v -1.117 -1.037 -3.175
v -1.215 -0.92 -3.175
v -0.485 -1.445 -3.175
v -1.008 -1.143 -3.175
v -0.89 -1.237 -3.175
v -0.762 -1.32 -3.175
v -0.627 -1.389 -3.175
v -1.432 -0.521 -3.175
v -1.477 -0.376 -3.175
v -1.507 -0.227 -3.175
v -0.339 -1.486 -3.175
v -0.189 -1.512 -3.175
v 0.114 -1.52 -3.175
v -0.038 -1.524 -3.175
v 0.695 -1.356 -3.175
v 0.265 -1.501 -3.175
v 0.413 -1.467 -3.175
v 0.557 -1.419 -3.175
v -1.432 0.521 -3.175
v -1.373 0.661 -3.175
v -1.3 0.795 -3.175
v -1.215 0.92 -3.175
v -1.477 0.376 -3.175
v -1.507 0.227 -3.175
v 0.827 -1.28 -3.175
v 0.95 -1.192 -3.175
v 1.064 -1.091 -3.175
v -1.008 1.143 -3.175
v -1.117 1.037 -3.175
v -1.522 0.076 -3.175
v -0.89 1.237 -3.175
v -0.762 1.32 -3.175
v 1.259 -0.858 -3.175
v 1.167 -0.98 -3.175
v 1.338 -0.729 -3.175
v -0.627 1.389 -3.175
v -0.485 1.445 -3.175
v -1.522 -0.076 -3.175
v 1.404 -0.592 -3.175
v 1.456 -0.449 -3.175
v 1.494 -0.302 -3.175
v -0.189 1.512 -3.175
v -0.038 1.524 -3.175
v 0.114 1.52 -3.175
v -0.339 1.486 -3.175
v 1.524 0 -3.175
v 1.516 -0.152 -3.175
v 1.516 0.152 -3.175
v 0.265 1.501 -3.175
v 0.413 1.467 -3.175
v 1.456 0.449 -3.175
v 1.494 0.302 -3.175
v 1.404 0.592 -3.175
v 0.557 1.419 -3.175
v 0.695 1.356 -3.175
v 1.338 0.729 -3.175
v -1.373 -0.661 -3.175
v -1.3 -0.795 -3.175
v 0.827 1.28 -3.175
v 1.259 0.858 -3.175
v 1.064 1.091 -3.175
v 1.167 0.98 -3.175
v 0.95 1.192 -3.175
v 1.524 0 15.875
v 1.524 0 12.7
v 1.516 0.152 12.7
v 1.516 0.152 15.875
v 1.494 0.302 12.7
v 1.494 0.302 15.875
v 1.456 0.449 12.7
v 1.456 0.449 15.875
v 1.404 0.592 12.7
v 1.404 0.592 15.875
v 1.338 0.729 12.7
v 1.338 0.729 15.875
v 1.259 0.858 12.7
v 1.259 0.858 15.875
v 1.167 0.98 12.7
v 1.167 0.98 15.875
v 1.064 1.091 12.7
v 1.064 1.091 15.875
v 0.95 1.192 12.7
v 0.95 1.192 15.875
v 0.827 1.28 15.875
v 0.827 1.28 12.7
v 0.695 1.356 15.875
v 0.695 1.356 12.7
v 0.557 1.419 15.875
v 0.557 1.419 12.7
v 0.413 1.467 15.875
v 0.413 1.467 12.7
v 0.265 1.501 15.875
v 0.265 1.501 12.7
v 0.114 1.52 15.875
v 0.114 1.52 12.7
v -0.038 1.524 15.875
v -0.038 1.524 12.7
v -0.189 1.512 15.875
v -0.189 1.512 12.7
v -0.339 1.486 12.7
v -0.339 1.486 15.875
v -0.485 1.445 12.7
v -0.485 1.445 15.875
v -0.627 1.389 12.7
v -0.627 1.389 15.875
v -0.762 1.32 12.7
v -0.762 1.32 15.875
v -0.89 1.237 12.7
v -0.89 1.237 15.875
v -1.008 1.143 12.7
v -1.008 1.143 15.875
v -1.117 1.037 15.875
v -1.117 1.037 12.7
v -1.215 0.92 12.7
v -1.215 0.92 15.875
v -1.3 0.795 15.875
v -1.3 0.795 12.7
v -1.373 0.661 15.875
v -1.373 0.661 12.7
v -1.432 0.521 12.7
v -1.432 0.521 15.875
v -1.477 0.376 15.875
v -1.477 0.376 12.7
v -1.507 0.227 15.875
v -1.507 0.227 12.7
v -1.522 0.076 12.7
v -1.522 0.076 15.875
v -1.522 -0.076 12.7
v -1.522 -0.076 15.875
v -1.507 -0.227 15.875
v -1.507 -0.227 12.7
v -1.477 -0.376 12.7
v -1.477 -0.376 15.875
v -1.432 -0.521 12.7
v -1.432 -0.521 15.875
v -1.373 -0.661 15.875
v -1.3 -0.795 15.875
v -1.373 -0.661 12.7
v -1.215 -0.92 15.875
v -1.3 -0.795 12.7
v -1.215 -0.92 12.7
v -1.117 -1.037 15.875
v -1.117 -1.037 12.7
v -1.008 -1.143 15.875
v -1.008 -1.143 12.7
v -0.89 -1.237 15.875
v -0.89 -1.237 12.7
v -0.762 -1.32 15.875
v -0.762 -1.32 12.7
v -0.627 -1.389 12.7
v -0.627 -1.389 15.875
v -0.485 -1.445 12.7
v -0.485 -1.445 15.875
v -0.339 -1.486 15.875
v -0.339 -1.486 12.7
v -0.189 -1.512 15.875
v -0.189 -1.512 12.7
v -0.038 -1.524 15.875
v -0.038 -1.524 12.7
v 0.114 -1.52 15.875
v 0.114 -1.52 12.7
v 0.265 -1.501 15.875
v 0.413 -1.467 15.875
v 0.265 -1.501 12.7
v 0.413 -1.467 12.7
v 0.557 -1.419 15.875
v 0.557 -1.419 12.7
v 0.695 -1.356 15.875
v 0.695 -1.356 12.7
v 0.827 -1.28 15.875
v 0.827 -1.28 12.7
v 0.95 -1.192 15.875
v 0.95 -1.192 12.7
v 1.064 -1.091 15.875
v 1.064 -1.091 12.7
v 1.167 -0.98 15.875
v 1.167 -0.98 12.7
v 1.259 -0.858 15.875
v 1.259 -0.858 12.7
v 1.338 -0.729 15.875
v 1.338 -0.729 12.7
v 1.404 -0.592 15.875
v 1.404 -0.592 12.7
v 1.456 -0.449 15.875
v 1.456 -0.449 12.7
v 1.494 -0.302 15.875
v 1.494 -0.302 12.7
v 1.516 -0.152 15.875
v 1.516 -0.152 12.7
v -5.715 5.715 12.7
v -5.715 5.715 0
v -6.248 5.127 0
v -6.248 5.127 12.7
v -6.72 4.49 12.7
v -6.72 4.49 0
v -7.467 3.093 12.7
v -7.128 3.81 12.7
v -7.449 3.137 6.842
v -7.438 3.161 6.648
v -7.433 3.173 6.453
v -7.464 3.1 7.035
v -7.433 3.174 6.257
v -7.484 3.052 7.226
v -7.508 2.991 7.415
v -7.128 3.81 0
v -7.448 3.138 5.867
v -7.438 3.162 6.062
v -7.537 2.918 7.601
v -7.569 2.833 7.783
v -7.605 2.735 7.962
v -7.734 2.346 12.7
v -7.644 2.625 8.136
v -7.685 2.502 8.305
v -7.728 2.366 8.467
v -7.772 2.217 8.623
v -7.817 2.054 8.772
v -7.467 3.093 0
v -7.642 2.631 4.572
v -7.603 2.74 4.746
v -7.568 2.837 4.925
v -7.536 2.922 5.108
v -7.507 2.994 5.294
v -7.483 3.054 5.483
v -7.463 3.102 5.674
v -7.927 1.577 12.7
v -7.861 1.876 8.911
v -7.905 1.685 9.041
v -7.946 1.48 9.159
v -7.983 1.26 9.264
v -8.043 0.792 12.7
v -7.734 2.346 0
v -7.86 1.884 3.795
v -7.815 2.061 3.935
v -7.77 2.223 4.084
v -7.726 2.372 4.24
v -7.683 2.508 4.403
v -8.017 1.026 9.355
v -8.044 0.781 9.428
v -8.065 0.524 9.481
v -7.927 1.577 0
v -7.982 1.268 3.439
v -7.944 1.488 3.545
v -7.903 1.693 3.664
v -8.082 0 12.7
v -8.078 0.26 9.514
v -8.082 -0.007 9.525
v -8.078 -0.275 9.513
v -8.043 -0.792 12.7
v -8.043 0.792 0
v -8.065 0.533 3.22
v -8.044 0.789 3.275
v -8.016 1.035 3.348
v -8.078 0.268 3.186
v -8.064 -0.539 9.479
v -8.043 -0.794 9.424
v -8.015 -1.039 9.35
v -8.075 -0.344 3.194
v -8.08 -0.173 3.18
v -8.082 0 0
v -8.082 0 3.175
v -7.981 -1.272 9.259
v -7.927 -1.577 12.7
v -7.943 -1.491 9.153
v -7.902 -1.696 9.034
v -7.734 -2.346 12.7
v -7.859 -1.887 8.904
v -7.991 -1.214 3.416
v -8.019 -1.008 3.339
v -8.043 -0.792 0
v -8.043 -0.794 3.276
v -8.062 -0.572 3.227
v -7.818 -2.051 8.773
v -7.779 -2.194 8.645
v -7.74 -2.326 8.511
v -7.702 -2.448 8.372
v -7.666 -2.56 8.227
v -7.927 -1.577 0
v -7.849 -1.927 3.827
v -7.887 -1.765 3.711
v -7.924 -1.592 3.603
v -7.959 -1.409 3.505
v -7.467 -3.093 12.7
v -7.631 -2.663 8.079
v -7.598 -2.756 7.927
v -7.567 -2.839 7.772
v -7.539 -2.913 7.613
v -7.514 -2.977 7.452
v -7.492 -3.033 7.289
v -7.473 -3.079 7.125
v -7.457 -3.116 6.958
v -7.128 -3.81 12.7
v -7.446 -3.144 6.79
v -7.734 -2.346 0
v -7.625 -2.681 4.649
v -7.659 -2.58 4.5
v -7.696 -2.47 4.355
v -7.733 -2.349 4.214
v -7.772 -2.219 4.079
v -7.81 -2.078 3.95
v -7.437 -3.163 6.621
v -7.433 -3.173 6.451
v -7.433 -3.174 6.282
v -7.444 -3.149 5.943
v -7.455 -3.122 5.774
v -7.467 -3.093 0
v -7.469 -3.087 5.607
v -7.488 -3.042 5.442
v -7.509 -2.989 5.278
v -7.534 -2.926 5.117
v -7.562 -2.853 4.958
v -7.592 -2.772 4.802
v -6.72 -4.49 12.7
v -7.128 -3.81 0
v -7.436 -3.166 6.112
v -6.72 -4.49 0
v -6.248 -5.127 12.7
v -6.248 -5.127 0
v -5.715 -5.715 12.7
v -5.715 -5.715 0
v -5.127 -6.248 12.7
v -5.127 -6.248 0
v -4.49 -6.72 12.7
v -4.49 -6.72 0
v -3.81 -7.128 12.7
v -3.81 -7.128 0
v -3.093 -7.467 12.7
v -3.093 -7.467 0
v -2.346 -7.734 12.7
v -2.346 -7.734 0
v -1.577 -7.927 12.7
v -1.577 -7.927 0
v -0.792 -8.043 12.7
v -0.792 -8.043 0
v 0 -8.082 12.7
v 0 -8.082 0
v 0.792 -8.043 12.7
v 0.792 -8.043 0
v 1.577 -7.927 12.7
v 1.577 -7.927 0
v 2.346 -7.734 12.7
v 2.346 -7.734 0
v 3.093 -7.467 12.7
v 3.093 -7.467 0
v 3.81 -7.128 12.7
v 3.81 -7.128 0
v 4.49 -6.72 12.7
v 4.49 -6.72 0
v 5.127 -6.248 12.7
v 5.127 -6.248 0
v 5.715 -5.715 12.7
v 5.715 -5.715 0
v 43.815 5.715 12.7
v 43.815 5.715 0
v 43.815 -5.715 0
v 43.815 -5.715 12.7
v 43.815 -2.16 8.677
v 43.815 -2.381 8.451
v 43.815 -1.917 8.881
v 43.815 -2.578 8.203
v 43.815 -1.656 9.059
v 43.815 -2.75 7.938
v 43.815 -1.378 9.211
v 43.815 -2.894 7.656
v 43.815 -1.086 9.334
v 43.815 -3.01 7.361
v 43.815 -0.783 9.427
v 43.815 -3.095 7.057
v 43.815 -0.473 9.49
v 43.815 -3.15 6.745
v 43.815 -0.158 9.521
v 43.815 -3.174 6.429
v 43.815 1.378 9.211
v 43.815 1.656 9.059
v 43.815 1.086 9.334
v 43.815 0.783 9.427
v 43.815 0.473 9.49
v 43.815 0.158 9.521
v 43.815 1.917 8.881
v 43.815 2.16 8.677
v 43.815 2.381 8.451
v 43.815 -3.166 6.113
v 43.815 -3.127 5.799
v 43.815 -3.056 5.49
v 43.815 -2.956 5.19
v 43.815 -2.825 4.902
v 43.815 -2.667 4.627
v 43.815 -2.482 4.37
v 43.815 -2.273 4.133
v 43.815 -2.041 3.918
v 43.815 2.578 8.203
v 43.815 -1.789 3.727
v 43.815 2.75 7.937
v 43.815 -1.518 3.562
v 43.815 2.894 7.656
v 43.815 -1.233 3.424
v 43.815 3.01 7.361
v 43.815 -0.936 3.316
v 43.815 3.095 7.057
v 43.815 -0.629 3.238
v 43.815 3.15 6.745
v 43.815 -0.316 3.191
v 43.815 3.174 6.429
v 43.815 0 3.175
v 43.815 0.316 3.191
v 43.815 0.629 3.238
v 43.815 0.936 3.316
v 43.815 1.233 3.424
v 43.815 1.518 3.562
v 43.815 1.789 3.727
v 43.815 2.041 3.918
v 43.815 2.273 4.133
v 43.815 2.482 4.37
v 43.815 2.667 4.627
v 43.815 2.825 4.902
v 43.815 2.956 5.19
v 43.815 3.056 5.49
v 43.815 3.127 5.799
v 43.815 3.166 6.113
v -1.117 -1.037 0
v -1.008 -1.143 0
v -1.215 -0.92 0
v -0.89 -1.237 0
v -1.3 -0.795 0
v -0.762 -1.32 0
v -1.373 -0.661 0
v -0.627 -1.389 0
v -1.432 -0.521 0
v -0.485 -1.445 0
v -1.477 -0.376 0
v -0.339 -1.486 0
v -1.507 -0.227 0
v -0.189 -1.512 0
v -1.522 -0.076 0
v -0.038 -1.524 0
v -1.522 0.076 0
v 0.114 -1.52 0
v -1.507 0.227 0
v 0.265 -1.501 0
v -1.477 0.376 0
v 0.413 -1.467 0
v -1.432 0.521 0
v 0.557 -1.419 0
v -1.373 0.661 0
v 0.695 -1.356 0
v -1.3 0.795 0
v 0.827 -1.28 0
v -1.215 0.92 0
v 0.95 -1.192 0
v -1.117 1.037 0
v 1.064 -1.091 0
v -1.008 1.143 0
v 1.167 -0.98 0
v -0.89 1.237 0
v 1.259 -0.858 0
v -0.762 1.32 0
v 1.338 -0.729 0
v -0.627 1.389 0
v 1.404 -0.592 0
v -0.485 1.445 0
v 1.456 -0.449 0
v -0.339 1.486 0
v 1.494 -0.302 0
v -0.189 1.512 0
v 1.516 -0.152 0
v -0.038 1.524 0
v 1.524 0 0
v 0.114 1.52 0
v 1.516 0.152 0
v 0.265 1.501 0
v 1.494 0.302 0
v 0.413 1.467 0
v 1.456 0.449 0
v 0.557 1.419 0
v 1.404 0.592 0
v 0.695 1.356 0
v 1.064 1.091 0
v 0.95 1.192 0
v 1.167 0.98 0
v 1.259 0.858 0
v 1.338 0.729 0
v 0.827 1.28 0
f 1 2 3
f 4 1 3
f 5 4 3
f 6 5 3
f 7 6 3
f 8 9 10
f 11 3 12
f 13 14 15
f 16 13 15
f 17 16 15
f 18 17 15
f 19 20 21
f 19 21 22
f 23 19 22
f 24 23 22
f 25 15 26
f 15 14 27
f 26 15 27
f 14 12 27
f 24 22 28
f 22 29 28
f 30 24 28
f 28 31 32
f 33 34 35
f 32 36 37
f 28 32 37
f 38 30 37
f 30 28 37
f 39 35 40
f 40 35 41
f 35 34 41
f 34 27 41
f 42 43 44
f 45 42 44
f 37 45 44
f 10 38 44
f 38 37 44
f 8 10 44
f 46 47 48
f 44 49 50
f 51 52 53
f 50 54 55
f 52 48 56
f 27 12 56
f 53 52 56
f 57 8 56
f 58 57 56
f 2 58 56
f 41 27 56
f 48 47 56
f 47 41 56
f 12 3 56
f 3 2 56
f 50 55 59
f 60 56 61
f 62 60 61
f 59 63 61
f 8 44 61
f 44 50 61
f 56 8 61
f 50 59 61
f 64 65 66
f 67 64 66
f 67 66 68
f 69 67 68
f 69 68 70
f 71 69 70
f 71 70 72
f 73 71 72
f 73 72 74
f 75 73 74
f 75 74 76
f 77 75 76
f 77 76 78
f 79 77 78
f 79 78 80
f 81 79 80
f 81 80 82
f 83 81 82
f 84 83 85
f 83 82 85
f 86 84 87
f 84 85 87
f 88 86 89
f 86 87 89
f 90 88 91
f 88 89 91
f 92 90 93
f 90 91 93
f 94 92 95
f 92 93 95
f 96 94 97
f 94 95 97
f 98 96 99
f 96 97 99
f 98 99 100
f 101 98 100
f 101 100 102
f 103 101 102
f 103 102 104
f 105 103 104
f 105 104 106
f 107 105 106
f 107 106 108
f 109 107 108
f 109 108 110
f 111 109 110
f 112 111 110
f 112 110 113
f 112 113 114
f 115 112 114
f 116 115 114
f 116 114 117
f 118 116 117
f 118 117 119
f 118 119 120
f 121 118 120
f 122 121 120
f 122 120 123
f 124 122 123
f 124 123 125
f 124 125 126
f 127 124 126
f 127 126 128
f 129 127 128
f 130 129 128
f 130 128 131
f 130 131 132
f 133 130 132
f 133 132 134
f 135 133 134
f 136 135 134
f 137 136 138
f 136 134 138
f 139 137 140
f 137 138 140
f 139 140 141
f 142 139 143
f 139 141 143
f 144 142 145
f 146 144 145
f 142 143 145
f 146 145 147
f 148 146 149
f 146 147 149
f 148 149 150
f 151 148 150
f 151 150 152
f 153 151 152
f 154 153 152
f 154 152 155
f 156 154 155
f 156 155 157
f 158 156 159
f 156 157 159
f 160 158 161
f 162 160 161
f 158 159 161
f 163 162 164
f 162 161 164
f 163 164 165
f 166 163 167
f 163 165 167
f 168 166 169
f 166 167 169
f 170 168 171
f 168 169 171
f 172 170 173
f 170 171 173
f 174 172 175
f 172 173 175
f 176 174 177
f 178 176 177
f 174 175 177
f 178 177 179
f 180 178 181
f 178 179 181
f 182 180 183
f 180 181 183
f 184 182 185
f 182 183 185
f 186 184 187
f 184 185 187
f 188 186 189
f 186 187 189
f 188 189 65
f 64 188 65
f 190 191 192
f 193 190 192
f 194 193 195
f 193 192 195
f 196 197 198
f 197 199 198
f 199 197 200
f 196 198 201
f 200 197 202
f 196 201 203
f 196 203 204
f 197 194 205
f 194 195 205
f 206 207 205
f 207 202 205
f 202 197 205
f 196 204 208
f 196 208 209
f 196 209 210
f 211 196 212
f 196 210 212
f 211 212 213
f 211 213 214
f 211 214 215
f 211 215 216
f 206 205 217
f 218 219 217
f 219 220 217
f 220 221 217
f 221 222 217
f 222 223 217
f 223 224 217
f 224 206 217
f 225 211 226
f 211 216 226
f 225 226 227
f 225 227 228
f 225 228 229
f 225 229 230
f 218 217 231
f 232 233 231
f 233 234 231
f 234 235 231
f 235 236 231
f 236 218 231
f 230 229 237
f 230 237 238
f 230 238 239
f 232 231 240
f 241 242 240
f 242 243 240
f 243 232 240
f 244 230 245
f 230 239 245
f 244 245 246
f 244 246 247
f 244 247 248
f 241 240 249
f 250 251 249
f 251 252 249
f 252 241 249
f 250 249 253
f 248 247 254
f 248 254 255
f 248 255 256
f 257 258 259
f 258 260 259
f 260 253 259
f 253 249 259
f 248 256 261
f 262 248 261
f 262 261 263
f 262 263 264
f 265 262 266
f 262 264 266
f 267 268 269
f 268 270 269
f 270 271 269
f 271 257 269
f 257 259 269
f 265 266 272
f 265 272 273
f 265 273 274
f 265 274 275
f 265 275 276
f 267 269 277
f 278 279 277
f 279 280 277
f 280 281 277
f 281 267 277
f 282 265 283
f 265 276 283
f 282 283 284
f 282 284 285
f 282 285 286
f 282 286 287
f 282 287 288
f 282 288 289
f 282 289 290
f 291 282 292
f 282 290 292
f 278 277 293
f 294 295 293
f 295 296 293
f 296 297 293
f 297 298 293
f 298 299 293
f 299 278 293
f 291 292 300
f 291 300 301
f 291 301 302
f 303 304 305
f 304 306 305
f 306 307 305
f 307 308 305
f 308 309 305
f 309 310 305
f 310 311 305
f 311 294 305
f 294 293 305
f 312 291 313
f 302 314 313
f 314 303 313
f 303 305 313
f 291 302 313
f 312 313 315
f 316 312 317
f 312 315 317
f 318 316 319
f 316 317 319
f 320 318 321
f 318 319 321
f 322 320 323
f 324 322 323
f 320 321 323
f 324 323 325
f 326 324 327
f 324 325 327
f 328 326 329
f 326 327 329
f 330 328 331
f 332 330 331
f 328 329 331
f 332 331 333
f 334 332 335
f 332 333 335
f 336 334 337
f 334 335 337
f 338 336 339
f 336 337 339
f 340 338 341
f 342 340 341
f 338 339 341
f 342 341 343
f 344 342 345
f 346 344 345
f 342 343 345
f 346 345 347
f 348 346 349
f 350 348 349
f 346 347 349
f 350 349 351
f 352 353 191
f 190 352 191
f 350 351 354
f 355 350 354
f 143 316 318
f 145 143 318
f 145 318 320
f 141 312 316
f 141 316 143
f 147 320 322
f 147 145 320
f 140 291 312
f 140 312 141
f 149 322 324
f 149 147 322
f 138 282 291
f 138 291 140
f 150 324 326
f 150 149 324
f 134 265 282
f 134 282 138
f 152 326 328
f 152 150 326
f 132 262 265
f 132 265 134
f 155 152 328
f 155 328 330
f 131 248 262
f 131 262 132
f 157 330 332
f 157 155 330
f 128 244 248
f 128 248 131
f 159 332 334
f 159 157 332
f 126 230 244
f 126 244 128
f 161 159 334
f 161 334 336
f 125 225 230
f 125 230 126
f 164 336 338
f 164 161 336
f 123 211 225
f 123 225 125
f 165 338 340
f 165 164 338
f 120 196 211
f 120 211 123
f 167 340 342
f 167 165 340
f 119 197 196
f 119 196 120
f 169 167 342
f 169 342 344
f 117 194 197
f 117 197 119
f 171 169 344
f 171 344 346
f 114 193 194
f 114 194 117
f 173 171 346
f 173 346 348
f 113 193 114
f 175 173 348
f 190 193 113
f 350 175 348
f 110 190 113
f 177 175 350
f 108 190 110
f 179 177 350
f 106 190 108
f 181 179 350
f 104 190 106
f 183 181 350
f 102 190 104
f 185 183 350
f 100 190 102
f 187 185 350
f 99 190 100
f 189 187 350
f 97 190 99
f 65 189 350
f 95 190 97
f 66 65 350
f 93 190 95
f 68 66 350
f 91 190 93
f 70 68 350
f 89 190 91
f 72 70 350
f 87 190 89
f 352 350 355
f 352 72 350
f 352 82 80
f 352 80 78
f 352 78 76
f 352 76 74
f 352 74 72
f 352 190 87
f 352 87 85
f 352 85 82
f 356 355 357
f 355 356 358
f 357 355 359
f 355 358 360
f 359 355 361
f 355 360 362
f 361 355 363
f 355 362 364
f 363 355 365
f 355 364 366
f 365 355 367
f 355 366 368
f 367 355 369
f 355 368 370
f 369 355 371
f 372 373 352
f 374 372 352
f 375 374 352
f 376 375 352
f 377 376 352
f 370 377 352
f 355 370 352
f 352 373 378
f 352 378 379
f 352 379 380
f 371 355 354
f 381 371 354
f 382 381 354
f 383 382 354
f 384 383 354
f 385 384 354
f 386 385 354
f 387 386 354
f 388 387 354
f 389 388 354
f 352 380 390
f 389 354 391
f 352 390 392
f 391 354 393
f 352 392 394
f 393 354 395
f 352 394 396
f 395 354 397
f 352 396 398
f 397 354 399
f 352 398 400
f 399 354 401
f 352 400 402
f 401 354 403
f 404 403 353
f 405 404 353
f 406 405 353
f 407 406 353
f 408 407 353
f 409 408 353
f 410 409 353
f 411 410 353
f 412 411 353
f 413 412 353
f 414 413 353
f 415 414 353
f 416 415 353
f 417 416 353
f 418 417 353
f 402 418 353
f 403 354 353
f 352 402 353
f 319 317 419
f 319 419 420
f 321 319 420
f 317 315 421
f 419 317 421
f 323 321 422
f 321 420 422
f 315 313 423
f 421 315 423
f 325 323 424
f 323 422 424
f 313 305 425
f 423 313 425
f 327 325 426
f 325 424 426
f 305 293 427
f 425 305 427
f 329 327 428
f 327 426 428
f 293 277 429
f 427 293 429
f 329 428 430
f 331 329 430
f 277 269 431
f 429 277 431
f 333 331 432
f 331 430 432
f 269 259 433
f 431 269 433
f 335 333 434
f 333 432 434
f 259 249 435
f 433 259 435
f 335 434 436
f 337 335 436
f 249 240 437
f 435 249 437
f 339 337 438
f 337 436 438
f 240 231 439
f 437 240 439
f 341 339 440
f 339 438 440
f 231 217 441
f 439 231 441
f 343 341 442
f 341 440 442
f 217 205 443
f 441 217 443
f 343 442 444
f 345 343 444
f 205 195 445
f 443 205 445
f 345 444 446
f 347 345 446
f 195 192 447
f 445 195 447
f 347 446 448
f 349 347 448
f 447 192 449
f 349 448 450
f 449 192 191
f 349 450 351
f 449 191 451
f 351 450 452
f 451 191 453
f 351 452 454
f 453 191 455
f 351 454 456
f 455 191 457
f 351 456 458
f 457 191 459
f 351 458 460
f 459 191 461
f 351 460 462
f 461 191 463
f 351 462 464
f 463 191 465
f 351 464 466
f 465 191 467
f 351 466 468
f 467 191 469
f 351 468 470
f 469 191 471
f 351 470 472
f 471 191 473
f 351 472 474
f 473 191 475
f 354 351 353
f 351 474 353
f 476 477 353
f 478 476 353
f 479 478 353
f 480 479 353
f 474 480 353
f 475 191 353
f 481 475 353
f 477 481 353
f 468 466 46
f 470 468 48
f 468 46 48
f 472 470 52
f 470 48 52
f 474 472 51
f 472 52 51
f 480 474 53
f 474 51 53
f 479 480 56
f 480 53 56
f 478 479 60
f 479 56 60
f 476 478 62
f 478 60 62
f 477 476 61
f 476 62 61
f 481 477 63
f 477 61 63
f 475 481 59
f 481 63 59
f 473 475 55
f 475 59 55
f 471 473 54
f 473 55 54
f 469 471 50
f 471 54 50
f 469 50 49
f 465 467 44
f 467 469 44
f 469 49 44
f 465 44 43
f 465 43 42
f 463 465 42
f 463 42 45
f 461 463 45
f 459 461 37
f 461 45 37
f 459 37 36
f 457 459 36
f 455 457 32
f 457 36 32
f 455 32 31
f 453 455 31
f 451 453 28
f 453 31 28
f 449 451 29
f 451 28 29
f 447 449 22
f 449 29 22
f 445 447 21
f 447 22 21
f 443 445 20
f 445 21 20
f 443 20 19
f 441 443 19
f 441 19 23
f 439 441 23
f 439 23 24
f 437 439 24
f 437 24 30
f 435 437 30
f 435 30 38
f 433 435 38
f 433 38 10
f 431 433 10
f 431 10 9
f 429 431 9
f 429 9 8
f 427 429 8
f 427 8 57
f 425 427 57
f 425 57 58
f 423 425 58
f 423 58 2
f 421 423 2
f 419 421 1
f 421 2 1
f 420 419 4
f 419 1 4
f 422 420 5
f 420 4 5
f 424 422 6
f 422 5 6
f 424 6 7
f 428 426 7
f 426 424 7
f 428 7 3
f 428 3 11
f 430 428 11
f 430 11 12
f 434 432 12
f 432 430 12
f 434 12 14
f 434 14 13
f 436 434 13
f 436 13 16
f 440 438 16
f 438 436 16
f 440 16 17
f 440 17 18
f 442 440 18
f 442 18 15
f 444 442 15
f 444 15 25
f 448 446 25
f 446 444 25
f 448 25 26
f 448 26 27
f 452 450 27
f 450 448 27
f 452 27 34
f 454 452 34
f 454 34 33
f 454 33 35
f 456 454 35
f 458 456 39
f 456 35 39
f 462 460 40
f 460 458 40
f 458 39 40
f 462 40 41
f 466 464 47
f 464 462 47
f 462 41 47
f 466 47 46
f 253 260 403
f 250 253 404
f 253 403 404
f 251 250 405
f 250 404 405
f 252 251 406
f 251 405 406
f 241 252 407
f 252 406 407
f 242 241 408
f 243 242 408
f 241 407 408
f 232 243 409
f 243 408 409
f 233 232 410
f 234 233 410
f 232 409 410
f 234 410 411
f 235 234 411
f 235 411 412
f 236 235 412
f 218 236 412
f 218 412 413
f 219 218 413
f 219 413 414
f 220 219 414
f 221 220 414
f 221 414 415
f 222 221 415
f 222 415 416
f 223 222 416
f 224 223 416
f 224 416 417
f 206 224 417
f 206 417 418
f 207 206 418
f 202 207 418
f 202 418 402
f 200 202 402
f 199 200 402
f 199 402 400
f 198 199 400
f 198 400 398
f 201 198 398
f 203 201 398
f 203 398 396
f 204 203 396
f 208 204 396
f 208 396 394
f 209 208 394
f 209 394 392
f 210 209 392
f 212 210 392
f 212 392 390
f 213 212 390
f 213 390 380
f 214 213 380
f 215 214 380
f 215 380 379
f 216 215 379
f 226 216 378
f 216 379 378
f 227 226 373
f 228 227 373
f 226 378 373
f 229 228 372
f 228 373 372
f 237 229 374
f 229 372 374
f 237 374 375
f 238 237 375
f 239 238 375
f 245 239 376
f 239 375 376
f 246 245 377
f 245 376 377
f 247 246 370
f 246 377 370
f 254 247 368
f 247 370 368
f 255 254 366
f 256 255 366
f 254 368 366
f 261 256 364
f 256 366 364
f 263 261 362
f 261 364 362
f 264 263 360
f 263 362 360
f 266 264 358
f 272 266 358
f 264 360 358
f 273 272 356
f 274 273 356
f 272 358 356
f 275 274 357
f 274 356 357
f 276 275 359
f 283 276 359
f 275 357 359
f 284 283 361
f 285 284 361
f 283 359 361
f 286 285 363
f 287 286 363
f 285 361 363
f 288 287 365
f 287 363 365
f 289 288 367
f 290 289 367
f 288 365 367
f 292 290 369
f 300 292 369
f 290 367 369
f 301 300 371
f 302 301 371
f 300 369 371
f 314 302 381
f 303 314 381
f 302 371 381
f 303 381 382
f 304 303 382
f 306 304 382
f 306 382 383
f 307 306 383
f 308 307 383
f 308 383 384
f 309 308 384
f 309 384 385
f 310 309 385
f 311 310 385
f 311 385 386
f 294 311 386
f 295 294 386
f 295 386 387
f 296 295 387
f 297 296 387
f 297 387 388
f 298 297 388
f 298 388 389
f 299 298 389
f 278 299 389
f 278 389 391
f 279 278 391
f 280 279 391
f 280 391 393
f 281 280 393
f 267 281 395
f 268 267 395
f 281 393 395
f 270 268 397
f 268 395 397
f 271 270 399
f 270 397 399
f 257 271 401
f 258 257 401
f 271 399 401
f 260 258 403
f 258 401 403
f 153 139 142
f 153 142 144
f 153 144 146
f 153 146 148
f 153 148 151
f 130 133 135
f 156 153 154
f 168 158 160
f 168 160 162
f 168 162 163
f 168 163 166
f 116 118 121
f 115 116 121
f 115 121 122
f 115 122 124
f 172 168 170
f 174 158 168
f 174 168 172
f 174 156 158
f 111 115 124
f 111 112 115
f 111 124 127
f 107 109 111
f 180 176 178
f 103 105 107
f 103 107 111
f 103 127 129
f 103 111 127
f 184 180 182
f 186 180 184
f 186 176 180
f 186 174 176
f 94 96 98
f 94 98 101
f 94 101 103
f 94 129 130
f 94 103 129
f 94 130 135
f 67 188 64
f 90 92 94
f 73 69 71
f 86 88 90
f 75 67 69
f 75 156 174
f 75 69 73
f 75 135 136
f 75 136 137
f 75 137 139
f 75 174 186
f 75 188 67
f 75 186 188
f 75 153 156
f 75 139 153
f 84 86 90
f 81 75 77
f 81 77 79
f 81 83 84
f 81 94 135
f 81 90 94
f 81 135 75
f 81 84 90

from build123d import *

# Parameters (mm, degrees)
BOSS_EXTRUDE1_DEPTH      = 12.7
BOSS_EXTRUDE2_DEPTH      = 3.175
BOSS_EXTRUDE2_DEPTH_BACK = 15.875
SKETCH3_R                = 1.524
SKETCH2_R                = 3.175
CUT_EXTRUDE1_DEPTH       = 55.869487053


with BuildPart() as part:
    # Sketch1 → Boss-Extrude1 (new body)
    with BuildSketch(Plane.XY):
        with BuildLine():
            Line((5.715, -5.715), (43.815, -5.715))
            Line((43.815, -5.715), (43.815, 5.715))
            Line((43.815, 5.715), (5.715, 5.715))
            Line((5.715, 5.715), (-5.715, 5.715))
            ThreePointArc((-5.715, 5.715), (-5.715, -5.715), (5.715, -5.715))
        make_face()
    extrude(amount=BOSS_EXTRUDE1_DEPTH)

    # Sketch3 → Boss-Extrude2 (add, two sides: drawn at the far end of the back side and taken through both)
    with BuildSketch(Plane.XY.offset(12.7).offset(-BOSS_EXTRUDE2_DEPTH_BACK)):
        Circle(SKETCH3_R)
    extrude(amount=BOSS_EXTRUDE2_DEPTH + BOSS_EXTRUDE2_DEPTH_BACK)

    # Sketch2 → Cut-Extrude1 (cut, through all)
    with BuildSketch(Plane(origin=(43.815, 0, 0), x_dir=(0, 0, -1), z_dir=(1, 0, 0))):
        with Locations((-6.35, 0)):
            Circle(SKETCH2_R)
    extrude(amount=-CUT_EXTRUDE1_DEPTH, mode=Mode.SUBTRACT)


solid = part.part
